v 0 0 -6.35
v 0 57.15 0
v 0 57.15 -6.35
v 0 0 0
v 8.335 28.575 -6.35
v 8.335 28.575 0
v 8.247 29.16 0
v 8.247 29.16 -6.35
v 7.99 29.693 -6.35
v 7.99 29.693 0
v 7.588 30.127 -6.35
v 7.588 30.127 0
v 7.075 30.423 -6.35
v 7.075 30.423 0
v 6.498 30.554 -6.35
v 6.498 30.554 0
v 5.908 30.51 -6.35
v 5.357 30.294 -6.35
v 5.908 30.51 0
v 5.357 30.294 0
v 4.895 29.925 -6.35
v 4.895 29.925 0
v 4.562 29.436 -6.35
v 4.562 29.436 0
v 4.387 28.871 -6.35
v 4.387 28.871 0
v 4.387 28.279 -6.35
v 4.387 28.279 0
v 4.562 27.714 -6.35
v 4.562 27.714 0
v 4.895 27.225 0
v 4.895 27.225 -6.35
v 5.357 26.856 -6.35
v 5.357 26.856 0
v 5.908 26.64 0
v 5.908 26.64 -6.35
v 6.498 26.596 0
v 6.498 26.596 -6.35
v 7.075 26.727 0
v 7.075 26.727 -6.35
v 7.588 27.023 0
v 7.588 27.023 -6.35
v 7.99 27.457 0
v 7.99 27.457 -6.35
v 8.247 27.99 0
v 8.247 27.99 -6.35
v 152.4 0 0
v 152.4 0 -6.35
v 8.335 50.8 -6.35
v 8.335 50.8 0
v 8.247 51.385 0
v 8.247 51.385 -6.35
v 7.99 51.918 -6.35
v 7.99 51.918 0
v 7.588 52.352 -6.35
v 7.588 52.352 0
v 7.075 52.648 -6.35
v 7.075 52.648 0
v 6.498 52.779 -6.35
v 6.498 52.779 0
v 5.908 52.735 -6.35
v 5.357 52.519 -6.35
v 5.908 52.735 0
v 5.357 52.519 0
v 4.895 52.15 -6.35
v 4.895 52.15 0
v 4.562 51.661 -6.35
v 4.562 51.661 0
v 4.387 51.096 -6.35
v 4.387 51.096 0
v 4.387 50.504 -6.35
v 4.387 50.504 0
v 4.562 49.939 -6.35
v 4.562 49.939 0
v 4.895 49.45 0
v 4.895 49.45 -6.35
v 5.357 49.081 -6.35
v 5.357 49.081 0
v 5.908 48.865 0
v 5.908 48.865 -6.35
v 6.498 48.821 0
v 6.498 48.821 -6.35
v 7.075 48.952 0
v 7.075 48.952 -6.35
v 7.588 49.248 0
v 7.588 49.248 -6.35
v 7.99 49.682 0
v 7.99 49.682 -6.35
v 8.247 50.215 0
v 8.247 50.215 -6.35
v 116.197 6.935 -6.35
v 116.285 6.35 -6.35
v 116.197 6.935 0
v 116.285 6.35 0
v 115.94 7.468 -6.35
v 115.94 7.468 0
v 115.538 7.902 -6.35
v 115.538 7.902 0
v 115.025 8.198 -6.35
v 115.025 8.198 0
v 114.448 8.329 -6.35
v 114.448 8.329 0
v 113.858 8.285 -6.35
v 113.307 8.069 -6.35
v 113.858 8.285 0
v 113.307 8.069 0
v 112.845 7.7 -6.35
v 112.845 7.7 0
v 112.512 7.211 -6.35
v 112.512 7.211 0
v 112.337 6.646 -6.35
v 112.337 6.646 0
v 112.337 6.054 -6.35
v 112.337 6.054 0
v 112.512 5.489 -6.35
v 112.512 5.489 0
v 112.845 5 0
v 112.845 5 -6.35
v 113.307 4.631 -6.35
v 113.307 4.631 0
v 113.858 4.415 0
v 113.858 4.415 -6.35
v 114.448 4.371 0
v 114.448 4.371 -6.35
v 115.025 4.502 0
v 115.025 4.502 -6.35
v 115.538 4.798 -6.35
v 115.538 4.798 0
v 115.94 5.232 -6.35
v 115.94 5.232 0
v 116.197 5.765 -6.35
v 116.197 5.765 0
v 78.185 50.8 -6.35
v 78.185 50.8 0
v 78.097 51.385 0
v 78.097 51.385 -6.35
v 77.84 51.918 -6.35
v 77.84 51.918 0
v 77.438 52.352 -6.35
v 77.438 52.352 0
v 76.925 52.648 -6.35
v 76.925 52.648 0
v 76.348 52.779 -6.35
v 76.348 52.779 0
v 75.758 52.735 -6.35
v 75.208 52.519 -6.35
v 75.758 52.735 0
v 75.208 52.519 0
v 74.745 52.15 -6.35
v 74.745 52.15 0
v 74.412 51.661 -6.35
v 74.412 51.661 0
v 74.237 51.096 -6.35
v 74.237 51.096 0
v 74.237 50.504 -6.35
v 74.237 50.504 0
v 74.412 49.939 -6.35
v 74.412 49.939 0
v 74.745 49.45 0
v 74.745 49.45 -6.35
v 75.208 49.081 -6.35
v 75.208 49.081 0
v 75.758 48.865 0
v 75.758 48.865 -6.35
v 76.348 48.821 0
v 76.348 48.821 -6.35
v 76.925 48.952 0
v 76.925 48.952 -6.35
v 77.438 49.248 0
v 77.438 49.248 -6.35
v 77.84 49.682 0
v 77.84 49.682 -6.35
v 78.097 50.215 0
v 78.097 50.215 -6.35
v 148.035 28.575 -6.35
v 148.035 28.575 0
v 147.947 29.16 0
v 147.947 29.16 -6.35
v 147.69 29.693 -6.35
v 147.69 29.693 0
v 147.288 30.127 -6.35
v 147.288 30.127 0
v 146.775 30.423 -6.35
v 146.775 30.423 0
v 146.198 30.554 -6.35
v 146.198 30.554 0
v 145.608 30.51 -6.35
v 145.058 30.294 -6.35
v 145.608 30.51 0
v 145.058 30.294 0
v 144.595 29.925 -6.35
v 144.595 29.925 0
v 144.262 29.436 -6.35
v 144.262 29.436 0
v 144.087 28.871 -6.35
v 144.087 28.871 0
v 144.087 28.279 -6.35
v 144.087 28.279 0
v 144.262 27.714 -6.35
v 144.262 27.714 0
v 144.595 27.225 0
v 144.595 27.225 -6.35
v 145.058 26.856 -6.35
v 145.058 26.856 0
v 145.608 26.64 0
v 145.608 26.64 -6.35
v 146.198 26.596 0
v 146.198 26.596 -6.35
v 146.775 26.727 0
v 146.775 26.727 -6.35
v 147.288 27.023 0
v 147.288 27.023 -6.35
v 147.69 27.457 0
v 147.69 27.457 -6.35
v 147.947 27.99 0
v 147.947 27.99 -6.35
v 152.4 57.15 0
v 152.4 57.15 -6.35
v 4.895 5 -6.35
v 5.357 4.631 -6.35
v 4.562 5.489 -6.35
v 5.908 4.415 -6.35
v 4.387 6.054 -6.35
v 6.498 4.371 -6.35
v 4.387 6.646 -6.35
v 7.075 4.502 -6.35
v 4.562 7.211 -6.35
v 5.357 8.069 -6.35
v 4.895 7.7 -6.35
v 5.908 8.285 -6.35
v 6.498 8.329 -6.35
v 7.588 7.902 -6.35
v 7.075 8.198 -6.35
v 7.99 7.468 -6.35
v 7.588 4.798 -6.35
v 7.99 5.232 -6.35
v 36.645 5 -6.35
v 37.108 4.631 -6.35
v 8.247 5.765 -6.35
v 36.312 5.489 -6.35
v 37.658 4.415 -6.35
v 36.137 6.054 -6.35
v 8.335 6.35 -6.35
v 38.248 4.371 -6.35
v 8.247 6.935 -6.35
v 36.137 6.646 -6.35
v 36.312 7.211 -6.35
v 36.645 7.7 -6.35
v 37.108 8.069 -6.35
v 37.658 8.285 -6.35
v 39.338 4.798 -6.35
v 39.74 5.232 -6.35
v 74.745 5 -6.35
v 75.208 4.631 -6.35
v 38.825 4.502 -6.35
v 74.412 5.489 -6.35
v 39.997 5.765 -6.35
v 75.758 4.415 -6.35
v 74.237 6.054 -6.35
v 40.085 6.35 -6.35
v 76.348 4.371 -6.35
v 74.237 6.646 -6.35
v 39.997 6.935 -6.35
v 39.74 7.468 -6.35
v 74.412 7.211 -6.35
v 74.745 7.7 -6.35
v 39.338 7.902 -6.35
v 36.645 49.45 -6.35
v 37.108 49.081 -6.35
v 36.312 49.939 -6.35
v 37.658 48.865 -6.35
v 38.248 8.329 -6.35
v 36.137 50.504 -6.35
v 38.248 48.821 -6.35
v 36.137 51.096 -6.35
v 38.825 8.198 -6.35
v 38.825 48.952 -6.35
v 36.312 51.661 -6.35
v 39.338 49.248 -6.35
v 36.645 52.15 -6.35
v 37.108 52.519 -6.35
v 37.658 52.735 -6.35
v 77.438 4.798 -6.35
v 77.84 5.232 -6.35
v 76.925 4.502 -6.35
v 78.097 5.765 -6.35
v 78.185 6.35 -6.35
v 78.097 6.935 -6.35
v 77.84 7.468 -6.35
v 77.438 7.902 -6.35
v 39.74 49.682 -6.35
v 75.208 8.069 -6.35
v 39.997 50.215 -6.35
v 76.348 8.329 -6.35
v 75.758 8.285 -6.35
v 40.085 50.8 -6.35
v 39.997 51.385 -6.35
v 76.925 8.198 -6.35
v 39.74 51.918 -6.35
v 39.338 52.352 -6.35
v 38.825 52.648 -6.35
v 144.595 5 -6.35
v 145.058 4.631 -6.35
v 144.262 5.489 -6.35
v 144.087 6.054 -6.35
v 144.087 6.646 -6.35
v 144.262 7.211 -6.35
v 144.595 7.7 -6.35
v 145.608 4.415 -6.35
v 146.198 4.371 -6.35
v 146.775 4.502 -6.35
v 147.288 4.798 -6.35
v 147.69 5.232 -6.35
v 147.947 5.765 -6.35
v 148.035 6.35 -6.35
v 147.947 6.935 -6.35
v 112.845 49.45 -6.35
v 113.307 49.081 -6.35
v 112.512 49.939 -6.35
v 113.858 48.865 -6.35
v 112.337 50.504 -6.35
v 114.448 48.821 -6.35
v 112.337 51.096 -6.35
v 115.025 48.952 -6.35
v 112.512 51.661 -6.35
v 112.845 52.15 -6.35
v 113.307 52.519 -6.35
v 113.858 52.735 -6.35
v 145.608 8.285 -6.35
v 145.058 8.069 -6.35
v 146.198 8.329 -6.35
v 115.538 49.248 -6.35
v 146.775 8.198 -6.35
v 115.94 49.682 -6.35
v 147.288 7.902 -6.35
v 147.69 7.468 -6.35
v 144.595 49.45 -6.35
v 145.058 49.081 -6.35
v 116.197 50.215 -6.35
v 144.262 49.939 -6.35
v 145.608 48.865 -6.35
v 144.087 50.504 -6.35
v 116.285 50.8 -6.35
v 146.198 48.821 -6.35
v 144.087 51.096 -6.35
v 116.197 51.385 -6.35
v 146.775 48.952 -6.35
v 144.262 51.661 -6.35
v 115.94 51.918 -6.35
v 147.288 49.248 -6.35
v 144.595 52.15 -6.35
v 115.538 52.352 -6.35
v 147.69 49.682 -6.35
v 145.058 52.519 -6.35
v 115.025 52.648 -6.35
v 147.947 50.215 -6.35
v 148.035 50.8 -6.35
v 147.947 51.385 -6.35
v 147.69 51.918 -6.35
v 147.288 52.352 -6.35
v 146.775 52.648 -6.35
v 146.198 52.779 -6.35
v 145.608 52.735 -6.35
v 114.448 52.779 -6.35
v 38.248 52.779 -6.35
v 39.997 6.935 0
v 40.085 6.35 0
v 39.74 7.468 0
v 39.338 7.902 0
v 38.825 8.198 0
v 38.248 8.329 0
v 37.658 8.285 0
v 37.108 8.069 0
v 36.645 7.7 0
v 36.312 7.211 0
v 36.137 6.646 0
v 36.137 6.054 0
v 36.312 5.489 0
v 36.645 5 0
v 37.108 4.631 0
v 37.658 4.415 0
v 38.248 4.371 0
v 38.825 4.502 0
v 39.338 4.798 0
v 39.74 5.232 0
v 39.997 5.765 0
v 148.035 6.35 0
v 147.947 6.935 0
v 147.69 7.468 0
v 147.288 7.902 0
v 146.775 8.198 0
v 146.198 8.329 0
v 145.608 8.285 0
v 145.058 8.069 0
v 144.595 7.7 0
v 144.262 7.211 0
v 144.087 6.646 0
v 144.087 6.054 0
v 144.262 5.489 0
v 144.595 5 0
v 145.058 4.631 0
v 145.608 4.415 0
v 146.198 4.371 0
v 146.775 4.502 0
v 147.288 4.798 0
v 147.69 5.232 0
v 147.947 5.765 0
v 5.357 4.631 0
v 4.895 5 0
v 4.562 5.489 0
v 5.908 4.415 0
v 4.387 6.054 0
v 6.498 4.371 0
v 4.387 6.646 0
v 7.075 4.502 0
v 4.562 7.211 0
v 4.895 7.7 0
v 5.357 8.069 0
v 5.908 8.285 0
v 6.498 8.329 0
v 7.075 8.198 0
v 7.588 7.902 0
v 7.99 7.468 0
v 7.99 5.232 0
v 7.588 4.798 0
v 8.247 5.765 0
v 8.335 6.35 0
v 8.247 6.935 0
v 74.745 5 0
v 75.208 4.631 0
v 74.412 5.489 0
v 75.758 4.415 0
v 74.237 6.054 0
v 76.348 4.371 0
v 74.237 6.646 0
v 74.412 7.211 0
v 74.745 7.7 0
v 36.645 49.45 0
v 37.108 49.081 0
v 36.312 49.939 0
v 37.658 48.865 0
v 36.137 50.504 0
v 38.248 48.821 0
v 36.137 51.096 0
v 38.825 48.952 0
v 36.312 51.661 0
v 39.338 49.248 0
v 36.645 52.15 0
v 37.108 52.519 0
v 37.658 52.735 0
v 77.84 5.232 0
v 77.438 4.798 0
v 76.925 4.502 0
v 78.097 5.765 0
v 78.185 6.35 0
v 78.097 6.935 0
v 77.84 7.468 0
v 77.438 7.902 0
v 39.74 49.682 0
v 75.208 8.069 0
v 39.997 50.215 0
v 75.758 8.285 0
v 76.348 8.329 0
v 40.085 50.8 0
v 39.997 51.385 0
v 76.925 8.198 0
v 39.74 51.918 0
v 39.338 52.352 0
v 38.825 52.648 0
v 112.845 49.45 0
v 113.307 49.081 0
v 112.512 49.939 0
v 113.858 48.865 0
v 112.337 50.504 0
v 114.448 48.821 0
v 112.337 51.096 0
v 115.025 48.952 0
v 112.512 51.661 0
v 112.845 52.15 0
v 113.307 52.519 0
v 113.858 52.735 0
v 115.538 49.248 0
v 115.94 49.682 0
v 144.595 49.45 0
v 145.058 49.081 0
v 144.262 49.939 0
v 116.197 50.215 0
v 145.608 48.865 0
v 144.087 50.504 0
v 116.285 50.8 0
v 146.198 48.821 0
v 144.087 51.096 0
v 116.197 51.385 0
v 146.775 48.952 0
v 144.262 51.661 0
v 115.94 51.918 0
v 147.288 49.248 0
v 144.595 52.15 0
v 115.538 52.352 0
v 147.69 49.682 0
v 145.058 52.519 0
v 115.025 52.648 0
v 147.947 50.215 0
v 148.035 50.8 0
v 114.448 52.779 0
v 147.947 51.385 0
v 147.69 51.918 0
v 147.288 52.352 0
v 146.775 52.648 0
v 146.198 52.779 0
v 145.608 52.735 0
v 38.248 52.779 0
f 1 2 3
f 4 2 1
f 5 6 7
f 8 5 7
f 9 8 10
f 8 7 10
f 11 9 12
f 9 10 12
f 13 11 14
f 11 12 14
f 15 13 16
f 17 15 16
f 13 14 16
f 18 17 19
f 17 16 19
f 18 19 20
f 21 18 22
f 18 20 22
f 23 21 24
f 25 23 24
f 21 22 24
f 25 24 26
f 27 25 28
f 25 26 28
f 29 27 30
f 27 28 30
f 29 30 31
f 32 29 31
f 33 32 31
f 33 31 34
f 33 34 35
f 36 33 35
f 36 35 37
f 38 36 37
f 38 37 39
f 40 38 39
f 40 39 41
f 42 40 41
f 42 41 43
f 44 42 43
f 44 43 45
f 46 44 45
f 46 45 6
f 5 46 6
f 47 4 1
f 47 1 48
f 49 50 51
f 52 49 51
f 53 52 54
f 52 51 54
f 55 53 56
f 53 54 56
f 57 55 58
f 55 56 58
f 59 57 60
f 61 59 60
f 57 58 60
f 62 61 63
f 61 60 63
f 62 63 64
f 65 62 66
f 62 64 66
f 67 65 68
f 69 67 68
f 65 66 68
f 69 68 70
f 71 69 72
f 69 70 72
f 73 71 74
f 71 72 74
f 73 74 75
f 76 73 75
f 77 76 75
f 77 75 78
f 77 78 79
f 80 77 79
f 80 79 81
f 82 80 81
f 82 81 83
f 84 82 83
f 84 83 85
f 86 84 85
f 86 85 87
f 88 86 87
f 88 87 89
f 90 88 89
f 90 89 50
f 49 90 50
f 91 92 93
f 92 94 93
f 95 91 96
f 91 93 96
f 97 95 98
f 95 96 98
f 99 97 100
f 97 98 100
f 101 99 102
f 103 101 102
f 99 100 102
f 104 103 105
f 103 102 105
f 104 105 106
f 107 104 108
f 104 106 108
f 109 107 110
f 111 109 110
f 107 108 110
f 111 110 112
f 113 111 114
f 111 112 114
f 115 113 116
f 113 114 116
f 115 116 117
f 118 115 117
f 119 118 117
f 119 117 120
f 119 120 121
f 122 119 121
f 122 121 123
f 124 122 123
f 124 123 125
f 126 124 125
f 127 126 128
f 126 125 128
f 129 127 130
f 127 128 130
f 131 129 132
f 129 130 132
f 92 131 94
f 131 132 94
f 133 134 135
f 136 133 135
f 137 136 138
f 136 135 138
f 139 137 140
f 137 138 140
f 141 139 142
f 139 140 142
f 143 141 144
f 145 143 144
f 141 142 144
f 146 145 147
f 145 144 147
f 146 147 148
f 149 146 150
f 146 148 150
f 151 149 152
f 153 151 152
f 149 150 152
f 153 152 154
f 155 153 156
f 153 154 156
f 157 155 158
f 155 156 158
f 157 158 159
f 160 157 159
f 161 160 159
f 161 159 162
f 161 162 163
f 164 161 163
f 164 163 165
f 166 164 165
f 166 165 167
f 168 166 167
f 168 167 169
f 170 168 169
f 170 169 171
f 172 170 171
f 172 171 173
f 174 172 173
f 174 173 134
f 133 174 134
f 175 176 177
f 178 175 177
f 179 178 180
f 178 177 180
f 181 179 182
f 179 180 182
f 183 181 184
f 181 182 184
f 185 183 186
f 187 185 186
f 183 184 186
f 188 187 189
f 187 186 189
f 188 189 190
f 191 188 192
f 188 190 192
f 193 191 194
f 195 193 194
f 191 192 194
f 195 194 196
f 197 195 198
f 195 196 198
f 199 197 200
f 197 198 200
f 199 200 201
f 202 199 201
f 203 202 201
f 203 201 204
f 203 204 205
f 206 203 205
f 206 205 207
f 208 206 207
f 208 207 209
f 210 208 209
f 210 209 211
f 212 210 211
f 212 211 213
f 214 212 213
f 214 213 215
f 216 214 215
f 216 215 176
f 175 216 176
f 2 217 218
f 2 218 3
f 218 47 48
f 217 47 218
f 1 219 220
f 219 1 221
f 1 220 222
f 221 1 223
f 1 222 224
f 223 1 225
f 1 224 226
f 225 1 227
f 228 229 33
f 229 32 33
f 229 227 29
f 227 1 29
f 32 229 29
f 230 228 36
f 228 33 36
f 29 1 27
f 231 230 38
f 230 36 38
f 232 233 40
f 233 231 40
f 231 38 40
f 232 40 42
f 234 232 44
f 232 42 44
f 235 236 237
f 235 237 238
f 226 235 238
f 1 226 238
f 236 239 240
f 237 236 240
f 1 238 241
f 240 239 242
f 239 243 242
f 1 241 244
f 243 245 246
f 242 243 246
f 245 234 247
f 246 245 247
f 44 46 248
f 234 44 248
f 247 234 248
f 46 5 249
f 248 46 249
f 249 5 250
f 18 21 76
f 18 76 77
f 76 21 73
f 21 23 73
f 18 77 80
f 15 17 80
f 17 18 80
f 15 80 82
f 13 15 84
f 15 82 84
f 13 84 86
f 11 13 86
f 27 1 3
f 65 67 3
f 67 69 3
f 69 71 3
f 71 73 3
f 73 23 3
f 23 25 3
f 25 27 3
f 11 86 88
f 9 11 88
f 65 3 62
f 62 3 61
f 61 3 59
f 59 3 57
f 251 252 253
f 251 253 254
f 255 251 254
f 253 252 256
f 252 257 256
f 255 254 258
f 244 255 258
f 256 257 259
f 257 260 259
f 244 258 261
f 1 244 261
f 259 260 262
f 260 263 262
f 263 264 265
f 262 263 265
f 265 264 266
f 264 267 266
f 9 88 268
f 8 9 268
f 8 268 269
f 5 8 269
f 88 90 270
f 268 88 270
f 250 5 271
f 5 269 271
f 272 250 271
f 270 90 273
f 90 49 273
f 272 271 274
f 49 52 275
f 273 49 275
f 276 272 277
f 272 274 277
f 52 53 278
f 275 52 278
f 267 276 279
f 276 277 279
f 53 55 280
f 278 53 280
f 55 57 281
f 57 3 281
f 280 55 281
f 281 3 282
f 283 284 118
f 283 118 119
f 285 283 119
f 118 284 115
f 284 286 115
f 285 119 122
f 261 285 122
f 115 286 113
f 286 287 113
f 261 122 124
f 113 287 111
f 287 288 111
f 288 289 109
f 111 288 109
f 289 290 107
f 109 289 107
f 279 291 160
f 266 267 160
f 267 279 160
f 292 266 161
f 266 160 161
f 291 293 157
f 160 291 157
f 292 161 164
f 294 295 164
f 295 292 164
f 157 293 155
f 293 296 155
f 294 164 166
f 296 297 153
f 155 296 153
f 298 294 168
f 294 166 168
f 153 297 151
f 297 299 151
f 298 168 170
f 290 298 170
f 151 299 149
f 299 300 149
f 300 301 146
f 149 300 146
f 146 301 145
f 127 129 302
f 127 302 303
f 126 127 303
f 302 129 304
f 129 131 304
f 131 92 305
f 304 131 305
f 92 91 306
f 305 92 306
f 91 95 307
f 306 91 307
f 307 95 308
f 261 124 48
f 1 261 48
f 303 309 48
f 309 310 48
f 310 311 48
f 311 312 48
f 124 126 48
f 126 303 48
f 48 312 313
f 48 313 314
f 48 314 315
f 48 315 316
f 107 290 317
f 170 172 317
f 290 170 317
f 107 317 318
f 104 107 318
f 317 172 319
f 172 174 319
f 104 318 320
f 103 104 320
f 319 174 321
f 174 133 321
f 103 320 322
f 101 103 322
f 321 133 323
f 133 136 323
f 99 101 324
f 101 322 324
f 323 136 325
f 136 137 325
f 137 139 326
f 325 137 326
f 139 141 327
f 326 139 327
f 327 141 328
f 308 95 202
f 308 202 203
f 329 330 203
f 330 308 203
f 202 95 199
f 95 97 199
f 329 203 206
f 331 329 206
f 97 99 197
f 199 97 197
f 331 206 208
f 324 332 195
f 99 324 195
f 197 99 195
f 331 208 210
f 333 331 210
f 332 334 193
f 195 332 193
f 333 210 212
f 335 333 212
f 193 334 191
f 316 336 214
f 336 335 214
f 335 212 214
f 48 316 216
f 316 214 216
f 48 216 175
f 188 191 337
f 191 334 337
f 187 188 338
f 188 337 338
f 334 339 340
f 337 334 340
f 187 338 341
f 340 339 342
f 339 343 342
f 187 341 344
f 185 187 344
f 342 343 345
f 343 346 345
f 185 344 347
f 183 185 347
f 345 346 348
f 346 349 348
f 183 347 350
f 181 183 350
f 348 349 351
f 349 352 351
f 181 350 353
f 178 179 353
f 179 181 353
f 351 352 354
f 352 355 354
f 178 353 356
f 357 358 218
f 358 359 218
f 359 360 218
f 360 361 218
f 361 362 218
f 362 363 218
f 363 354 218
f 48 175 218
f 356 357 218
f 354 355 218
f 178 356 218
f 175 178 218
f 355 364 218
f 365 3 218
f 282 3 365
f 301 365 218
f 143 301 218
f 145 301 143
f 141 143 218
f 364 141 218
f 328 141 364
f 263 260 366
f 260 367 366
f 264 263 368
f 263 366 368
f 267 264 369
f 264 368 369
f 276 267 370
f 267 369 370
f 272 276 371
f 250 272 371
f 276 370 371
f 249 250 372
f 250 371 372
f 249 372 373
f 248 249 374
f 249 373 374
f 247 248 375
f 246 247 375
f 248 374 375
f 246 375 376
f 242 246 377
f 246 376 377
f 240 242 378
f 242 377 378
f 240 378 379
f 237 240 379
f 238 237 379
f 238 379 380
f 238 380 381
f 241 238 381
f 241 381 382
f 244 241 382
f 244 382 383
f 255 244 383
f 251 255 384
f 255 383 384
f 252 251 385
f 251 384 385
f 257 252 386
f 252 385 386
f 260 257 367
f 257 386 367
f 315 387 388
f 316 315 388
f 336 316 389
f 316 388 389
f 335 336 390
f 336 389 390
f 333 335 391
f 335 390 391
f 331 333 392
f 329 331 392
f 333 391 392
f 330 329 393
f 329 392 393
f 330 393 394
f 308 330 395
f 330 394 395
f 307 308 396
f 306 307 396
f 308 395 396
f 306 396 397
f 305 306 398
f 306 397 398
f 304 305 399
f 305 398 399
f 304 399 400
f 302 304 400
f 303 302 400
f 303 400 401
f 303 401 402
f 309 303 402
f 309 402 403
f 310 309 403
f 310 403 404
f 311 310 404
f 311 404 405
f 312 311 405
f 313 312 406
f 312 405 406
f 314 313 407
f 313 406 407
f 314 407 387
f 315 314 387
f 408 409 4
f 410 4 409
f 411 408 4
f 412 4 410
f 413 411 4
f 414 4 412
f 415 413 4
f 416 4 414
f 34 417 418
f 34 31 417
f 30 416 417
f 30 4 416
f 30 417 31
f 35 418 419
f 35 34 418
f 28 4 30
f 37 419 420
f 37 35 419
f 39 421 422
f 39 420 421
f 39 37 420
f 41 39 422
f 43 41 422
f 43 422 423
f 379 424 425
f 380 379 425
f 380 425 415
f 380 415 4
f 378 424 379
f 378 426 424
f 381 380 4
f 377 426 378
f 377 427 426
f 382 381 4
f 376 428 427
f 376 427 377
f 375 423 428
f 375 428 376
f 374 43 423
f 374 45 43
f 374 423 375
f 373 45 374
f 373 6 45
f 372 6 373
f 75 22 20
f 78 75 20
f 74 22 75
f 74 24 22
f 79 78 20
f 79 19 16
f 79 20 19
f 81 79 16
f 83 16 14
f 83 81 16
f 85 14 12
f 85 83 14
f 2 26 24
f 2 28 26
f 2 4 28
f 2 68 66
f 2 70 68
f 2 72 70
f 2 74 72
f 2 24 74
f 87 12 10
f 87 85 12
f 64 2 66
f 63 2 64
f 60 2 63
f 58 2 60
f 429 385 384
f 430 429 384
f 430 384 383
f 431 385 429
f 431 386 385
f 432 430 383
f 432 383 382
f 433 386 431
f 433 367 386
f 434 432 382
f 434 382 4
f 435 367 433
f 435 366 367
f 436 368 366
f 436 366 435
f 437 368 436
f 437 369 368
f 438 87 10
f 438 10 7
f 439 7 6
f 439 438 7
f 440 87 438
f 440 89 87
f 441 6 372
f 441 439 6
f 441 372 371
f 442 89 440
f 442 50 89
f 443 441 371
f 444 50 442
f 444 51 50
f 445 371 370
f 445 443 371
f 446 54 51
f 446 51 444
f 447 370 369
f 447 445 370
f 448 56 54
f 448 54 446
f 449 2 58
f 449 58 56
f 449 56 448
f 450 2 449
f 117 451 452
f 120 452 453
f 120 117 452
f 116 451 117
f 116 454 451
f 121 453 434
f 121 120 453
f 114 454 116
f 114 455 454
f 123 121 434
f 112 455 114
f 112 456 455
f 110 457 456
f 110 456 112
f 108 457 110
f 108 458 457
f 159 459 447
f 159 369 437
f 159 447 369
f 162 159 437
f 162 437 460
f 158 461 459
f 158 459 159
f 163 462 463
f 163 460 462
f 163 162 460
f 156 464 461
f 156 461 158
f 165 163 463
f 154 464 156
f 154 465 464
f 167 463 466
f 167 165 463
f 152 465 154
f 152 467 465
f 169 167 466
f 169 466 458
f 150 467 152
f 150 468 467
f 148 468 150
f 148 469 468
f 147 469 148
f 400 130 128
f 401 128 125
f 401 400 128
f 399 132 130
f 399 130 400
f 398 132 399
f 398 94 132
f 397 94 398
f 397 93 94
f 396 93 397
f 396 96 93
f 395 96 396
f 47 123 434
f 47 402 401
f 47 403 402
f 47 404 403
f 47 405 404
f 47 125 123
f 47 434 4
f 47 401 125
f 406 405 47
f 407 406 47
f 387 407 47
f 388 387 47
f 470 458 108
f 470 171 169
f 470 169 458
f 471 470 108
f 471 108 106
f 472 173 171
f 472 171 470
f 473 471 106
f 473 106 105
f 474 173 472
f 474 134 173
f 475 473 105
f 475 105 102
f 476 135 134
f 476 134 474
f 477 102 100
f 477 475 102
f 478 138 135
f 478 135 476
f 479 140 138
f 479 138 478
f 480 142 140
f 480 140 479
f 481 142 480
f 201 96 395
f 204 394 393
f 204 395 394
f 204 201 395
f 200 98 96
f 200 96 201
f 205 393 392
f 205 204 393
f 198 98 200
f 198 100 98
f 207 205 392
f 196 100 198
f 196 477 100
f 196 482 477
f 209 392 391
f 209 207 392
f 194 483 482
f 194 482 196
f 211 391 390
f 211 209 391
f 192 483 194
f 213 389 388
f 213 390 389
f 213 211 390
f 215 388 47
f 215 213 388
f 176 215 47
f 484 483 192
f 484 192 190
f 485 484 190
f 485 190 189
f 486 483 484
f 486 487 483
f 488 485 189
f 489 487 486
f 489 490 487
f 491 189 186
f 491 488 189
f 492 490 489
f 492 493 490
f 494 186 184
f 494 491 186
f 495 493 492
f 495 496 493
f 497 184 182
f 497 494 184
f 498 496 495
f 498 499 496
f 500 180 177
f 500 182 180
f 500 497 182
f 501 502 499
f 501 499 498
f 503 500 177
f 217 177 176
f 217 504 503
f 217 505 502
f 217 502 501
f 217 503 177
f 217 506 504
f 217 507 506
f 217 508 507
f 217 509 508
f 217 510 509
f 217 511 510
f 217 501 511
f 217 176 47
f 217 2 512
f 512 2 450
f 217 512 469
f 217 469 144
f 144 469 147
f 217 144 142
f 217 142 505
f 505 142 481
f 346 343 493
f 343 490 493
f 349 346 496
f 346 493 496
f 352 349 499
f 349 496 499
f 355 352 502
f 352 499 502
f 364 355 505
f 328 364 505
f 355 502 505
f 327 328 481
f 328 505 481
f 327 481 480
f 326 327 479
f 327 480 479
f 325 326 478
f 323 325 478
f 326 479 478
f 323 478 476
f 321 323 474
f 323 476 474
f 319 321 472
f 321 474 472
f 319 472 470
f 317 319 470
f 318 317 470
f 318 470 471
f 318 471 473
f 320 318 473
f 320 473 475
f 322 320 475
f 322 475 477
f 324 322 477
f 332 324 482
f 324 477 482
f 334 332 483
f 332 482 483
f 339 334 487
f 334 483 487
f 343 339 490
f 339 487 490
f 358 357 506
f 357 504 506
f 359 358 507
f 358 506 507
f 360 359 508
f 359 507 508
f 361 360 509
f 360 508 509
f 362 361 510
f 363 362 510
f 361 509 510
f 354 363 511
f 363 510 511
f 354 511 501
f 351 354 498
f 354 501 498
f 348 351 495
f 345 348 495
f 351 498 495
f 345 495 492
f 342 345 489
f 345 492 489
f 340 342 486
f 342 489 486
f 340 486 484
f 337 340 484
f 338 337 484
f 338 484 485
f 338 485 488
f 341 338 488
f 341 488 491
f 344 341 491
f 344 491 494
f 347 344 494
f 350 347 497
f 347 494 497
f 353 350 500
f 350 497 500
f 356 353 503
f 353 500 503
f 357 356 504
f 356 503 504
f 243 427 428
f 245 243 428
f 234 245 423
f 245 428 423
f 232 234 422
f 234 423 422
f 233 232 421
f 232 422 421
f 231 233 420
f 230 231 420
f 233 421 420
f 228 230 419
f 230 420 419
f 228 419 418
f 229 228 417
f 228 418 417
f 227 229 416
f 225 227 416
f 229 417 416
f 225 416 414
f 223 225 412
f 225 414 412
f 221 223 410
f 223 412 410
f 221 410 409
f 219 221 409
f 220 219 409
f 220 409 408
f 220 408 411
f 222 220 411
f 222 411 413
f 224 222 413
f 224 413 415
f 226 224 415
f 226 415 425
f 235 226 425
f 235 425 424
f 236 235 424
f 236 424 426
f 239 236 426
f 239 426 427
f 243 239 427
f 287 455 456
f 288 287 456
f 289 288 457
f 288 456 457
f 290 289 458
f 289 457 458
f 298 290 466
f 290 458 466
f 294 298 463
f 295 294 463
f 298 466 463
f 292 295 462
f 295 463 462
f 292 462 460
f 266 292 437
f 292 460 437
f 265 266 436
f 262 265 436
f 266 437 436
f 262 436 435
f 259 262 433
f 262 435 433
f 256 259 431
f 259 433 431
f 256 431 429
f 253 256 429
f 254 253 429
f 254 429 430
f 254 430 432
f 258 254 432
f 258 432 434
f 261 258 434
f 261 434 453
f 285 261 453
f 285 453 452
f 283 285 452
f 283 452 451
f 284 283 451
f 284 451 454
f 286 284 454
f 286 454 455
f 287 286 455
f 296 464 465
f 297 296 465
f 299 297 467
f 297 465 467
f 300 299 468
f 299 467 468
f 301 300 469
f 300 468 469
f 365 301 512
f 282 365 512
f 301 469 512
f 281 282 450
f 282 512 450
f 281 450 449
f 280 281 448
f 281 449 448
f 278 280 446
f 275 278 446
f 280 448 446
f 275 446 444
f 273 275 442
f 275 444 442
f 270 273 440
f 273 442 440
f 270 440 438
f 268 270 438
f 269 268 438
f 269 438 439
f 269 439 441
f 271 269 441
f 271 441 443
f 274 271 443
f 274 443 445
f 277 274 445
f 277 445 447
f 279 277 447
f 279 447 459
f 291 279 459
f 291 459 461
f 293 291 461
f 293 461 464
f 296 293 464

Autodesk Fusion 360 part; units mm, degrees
sketch "Sketch1" plane through (0, 0, 0) normal (0, 0, 1) x (1, 0, 0)
  line L0 (0, 0) -> (152.4, 0)
  line L1 (152.4, 0) -> (152.4, 57.15)
  line L2 (152.4, 57.15) -> (0, 57.15)
  line L3 (0, 57.15) -> (0, 0)
  circle A0 centre (6.35, 6.35) radius 1.985
  circle A1 centre (146.05, 6.35) radius 1.985
  circle A2 centre (6.35, 50.8) radius 1.985
  circle A3 centre (146.05, 50.8) radius 1.985
  circle A4 centre (6.35, 6.35) radius 1.985
  circle A5 centre (6.35, 28.575) radius 1.985
  circle A6 centre (146.05, 28.575) radius 1.985
  circle A7 centre (76.2, 6.35) radius 1.985
  circle A8 centre (38.1, 6.35) radius 1.985
  circle A9 centre (114.3, 6.35) radius 1.985
  circle A10 centre (38.1, 50.8) radius 1.985
  circle A11 centre (76.2, 50.8) radius 1.985
  circle A12 centre (114.3, 50.8) radius 1.985
  point P0 (6.35, 6.35)
  dimension "d1" = 57.15
  dimension "d2" = 152.4
  dimension "d3" = 3.97
  dimension "d4" = 3.97
  dimension "d5" = 3.97
  dimension "d6" = 3.97
  dimension "d10" = 3.97
  dimension "d11" = 3.97
  dimension "d12" = 3.97
  dimension "d13" = 3.97
  dimension "d14" = 3.97
  dimension "d15" = 3.97
  dimension "d16" = 3.97
  dimension "d17" = 3.97
  dimension "d18" = 3.97
extrude "Extrude1" add sketch "Sketch1" against normal blind 6.35
